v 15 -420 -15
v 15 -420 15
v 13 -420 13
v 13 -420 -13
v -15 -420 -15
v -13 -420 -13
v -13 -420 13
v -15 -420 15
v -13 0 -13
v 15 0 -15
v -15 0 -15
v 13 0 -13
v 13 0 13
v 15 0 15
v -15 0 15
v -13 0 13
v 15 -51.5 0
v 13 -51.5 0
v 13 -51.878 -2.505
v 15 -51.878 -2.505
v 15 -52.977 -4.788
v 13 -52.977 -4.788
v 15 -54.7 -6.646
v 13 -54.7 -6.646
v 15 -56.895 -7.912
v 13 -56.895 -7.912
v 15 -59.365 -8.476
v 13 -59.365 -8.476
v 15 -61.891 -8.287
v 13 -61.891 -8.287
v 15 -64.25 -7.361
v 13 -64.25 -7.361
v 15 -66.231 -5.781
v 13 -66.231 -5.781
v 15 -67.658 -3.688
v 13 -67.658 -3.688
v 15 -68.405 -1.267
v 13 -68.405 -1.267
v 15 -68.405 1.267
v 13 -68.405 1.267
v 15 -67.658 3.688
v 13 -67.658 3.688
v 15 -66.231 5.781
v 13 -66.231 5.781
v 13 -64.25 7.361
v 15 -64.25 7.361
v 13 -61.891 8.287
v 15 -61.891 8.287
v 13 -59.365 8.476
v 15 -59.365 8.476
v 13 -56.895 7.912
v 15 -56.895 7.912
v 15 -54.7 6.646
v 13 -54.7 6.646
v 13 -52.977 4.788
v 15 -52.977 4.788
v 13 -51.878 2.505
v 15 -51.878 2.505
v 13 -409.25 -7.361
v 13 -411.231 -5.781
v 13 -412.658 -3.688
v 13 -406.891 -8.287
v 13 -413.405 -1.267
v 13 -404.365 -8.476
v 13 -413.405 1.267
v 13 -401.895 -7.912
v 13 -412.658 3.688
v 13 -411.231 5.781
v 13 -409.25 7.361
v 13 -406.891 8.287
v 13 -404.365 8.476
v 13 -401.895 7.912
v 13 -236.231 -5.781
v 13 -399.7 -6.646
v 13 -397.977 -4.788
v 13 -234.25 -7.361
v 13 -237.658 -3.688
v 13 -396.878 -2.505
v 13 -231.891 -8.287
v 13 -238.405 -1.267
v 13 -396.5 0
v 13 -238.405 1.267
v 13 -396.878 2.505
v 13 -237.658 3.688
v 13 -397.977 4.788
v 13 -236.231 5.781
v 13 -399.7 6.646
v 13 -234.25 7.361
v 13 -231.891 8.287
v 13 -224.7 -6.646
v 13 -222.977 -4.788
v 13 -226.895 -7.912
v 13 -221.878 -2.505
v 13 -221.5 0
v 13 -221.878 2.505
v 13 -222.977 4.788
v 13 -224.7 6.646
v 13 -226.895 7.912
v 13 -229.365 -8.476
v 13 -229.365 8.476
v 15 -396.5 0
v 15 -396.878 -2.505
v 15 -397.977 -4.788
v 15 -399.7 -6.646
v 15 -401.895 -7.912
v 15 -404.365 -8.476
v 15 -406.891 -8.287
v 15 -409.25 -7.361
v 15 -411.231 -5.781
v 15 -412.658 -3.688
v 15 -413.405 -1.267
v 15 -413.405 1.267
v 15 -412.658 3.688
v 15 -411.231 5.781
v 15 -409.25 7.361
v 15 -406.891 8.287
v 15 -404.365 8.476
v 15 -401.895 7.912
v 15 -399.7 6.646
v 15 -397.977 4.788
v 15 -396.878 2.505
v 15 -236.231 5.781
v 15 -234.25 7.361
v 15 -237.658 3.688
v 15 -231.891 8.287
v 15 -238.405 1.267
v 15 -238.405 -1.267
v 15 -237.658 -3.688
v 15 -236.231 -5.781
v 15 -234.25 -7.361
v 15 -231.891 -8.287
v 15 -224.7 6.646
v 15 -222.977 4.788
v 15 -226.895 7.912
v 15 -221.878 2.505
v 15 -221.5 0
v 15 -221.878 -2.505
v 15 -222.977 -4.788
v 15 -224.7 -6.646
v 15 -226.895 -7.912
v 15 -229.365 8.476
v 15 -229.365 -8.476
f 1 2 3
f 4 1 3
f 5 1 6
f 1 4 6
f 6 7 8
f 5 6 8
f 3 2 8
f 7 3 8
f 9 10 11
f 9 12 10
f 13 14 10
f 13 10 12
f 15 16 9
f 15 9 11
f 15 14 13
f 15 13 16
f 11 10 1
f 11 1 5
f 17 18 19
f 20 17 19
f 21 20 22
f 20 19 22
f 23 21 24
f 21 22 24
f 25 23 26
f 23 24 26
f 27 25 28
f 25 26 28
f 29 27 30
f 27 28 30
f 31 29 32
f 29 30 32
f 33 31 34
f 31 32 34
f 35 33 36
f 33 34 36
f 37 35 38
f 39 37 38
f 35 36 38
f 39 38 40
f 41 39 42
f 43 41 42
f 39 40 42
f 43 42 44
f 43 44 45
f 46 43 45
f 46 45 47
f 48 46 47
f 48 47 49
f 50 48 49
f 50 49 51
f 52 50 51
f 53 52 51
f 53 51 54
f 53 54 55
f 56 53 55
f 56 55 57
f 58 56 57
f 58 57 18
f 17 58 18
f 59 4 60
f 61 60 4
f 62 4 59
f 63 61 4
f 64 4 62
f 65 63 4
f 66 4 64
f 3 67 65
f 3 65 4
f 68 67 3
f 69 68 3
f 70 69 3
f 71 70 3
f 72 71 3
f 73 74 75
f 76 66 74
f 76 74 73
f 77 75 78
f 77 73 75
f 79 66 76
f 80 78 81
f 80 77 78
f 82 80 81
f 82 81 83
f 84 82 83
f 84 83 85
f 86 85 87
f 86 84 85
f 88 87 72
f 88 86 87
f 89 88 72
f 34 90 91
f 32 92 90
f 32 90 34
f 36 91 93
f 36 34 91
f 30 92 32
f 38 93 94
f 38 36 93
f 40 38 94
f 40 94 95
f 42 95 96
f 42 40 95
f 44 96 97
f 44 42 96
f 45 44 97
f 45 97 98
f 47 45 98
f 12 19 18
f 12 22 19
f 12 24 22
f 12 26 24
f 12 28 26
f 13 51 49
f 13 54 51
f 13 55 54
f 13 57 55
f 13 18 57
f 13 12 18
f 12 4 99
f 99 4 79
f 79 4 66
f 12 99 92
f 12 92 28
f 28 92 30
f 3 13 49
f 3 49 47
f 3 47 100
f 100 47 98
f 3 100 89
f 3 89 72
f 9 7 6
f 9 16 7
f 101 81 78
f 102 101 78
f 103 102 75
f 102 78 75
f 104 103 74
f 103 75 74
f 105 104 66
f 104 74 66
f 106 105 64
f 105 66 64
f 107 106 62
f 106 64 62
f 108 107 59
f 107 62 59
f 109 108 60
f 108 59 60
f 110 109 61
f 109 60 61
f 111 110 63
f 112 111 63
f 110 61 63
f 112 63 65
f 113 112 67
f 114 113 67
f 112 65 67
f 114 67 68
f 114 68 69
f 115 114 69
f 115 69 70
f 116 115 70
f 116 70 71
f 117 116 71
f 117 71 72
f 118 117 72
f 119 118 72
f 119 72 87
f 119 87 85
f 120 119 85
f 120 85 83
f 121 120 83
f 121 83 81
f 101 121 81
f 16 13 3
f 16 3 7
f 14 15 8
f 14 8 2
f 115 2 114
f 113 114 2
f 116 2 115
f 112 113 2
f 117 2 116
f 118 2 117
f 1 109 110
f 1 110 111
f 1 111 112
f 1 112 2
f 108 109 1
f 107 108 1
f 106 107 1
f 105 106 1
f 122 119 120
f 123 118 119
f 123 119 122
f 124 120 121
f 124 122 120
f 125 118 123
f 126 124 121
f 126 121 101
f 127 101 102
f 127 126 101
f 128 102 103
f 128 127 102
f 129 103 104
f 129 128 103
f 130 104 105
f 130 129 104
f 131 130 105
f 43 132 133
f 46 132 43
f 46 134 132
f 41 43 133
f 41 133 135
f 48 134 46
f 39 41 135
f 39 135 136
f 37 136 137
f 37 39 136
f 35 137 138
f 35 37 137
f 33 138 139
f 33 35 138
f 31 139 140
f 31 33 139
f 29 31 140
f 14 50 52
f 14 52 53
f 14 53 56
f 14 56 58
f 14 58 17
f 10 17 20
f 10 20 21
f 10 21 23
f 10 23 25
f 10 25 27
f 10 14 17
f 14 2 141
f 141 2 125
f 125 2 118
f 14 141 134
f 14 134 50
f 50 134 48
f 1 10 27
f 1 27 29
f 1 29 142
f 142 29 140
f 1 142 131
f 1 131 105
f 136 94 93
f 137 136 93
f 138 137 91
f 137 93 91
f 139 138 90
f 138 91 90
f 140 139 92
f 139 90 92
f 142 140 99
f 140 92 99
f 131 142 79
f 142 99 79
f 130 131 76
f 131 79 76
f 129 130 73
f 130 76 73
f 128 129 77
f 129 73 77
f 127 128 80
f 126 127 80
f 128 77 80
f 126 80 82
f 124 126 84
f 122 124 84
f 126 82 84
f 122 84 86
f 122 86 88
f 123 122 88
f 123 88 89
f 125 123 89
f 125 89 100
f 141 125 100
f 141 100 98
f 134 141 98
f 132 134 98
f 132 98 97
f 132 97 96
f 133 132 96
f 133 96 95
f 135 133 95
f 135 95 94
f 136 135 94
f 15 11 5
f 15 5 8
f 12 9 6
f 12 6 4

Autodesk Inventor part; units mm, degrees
ref_plane "YZ Plane" through (0, 0, 0) normal (1, 0, 0) x (0, 1, 0)
ref_plane "XZ Plane" through (0, 0, 0) normal (0, 1, 0) x (-1, 0, 0)
ref_plane "XY Plane" through (0, 0, 0) normal (0, 0, 1) x (1, 0, 0)
sketch "Sketch9" plane through (0, 0, 0) normal (0, 1, 0) x (-1, 0, 0)
  line L0 (15, 15) -> (-15, 15)
  line L1 (-15, 15) -> (-15, -15)
  line L2 (-15, -15) -> (15, -15)
  line L3 (15, -15) -> (15, 15)
  line L4 (15, 15) -> (-15, -15) construction
  line L5 (-15, 15) -> (15, -15) construction
  line L6 (-13, 13) -> (13, 13)
  line L7 (13, 13) -> (13, -13)
  line L8 (13, -13) -> (-13, -13)
  line L9 (-13, -13) -> (-13, 13)
  point P0 (0, 0)
  dimension "d172" = 30
  dimension "d173" = 30
  dimension "d174" = 2
extrude "Extrusion3" add sketch "Sketch9" against normal blind 420
sketch "Sketch10" plane through (0, 0, 0) normal (1, 0, 0) x (0, 1, 0)
  line L0 (0, 15) -> (0, -15) construction
  line L1 (0, 15) -> (-420, 15) construction
  line L2 (-420, -15) -> (-420, 15) construction
  line L3 (0, -15) -> (-420, -15) construction
  line L4 (-68.5, 8.5) -> (-51.5, 8.5)
  line L5 (-51.5, 8.5) -> (-51.5, -8.5)
  line L6 (-51.5, -8.5) -> (-68.5, -8.5)
  line L7 (-68.5, -8.5) -> (-68.5, 8.5)
  line L8 (-68.5, 8.5) -> (-51.5, -8.5) construction
  line L9 (-51.5, 8.5) -> (-68.5, -8.5) construction
  line L10 (-238.5, 8.5) -> (-221.5, 8.5)
  line L11 (-221.5, 8.5) -> (-221.5, -8.5)
  line L12 (-221.5, -8.5) -> (-238.5, -8.5)
  line L13 (-238.5, -8.5) -> (-238.5, 8.5)
  line L14 (-238.5, 8.5) -> (-221.5, -8.5) construction
  line L15 (-221.5, 8.5) -> (-238.5, -8.5) construction
  line L16 (-413.5, 8.5) -> (-396.5, 8.5)
  line L17 (-396.5, 8.5) -> (-396.5, -8.5)
  line L18 (-396.5, -8.5) -> (-413.5, -8.5)
  line L19 (-413.5, -8.5) -> (-413.5, 8.5)
  line L20 (-413.5, 8.5) -> (-396.5, -8.5) construction
  line L21 (-396.5, 8.5) -> (-413.5, -8.5) construction
  circle A0 centre (-470, 0) radius 8.5
  line L22 (0, 0) -> (30, 0)
  circle A1 centre (-60, 0) radius 8.5
  circle A2 centre (-230, 0) radius 8.5
  circle A3 centre (-405, 0) radius 8.5
  dimension "d177" = 17
  dimension "d178" = 17
  dimension "d181" = 30
  dimension "d182" = 90
  dimension "d183" = 260
  dimension "d184" = 435
  dimension "d185" = 500
  dimension "d186" = 17
extrude "Extrusion4" cut sketch "Sketch10" along normal through all contours A1 | A2 | A3
properties part number "TZS 1752 FDS 1200 way tube 2" material "Stainless Steel"
